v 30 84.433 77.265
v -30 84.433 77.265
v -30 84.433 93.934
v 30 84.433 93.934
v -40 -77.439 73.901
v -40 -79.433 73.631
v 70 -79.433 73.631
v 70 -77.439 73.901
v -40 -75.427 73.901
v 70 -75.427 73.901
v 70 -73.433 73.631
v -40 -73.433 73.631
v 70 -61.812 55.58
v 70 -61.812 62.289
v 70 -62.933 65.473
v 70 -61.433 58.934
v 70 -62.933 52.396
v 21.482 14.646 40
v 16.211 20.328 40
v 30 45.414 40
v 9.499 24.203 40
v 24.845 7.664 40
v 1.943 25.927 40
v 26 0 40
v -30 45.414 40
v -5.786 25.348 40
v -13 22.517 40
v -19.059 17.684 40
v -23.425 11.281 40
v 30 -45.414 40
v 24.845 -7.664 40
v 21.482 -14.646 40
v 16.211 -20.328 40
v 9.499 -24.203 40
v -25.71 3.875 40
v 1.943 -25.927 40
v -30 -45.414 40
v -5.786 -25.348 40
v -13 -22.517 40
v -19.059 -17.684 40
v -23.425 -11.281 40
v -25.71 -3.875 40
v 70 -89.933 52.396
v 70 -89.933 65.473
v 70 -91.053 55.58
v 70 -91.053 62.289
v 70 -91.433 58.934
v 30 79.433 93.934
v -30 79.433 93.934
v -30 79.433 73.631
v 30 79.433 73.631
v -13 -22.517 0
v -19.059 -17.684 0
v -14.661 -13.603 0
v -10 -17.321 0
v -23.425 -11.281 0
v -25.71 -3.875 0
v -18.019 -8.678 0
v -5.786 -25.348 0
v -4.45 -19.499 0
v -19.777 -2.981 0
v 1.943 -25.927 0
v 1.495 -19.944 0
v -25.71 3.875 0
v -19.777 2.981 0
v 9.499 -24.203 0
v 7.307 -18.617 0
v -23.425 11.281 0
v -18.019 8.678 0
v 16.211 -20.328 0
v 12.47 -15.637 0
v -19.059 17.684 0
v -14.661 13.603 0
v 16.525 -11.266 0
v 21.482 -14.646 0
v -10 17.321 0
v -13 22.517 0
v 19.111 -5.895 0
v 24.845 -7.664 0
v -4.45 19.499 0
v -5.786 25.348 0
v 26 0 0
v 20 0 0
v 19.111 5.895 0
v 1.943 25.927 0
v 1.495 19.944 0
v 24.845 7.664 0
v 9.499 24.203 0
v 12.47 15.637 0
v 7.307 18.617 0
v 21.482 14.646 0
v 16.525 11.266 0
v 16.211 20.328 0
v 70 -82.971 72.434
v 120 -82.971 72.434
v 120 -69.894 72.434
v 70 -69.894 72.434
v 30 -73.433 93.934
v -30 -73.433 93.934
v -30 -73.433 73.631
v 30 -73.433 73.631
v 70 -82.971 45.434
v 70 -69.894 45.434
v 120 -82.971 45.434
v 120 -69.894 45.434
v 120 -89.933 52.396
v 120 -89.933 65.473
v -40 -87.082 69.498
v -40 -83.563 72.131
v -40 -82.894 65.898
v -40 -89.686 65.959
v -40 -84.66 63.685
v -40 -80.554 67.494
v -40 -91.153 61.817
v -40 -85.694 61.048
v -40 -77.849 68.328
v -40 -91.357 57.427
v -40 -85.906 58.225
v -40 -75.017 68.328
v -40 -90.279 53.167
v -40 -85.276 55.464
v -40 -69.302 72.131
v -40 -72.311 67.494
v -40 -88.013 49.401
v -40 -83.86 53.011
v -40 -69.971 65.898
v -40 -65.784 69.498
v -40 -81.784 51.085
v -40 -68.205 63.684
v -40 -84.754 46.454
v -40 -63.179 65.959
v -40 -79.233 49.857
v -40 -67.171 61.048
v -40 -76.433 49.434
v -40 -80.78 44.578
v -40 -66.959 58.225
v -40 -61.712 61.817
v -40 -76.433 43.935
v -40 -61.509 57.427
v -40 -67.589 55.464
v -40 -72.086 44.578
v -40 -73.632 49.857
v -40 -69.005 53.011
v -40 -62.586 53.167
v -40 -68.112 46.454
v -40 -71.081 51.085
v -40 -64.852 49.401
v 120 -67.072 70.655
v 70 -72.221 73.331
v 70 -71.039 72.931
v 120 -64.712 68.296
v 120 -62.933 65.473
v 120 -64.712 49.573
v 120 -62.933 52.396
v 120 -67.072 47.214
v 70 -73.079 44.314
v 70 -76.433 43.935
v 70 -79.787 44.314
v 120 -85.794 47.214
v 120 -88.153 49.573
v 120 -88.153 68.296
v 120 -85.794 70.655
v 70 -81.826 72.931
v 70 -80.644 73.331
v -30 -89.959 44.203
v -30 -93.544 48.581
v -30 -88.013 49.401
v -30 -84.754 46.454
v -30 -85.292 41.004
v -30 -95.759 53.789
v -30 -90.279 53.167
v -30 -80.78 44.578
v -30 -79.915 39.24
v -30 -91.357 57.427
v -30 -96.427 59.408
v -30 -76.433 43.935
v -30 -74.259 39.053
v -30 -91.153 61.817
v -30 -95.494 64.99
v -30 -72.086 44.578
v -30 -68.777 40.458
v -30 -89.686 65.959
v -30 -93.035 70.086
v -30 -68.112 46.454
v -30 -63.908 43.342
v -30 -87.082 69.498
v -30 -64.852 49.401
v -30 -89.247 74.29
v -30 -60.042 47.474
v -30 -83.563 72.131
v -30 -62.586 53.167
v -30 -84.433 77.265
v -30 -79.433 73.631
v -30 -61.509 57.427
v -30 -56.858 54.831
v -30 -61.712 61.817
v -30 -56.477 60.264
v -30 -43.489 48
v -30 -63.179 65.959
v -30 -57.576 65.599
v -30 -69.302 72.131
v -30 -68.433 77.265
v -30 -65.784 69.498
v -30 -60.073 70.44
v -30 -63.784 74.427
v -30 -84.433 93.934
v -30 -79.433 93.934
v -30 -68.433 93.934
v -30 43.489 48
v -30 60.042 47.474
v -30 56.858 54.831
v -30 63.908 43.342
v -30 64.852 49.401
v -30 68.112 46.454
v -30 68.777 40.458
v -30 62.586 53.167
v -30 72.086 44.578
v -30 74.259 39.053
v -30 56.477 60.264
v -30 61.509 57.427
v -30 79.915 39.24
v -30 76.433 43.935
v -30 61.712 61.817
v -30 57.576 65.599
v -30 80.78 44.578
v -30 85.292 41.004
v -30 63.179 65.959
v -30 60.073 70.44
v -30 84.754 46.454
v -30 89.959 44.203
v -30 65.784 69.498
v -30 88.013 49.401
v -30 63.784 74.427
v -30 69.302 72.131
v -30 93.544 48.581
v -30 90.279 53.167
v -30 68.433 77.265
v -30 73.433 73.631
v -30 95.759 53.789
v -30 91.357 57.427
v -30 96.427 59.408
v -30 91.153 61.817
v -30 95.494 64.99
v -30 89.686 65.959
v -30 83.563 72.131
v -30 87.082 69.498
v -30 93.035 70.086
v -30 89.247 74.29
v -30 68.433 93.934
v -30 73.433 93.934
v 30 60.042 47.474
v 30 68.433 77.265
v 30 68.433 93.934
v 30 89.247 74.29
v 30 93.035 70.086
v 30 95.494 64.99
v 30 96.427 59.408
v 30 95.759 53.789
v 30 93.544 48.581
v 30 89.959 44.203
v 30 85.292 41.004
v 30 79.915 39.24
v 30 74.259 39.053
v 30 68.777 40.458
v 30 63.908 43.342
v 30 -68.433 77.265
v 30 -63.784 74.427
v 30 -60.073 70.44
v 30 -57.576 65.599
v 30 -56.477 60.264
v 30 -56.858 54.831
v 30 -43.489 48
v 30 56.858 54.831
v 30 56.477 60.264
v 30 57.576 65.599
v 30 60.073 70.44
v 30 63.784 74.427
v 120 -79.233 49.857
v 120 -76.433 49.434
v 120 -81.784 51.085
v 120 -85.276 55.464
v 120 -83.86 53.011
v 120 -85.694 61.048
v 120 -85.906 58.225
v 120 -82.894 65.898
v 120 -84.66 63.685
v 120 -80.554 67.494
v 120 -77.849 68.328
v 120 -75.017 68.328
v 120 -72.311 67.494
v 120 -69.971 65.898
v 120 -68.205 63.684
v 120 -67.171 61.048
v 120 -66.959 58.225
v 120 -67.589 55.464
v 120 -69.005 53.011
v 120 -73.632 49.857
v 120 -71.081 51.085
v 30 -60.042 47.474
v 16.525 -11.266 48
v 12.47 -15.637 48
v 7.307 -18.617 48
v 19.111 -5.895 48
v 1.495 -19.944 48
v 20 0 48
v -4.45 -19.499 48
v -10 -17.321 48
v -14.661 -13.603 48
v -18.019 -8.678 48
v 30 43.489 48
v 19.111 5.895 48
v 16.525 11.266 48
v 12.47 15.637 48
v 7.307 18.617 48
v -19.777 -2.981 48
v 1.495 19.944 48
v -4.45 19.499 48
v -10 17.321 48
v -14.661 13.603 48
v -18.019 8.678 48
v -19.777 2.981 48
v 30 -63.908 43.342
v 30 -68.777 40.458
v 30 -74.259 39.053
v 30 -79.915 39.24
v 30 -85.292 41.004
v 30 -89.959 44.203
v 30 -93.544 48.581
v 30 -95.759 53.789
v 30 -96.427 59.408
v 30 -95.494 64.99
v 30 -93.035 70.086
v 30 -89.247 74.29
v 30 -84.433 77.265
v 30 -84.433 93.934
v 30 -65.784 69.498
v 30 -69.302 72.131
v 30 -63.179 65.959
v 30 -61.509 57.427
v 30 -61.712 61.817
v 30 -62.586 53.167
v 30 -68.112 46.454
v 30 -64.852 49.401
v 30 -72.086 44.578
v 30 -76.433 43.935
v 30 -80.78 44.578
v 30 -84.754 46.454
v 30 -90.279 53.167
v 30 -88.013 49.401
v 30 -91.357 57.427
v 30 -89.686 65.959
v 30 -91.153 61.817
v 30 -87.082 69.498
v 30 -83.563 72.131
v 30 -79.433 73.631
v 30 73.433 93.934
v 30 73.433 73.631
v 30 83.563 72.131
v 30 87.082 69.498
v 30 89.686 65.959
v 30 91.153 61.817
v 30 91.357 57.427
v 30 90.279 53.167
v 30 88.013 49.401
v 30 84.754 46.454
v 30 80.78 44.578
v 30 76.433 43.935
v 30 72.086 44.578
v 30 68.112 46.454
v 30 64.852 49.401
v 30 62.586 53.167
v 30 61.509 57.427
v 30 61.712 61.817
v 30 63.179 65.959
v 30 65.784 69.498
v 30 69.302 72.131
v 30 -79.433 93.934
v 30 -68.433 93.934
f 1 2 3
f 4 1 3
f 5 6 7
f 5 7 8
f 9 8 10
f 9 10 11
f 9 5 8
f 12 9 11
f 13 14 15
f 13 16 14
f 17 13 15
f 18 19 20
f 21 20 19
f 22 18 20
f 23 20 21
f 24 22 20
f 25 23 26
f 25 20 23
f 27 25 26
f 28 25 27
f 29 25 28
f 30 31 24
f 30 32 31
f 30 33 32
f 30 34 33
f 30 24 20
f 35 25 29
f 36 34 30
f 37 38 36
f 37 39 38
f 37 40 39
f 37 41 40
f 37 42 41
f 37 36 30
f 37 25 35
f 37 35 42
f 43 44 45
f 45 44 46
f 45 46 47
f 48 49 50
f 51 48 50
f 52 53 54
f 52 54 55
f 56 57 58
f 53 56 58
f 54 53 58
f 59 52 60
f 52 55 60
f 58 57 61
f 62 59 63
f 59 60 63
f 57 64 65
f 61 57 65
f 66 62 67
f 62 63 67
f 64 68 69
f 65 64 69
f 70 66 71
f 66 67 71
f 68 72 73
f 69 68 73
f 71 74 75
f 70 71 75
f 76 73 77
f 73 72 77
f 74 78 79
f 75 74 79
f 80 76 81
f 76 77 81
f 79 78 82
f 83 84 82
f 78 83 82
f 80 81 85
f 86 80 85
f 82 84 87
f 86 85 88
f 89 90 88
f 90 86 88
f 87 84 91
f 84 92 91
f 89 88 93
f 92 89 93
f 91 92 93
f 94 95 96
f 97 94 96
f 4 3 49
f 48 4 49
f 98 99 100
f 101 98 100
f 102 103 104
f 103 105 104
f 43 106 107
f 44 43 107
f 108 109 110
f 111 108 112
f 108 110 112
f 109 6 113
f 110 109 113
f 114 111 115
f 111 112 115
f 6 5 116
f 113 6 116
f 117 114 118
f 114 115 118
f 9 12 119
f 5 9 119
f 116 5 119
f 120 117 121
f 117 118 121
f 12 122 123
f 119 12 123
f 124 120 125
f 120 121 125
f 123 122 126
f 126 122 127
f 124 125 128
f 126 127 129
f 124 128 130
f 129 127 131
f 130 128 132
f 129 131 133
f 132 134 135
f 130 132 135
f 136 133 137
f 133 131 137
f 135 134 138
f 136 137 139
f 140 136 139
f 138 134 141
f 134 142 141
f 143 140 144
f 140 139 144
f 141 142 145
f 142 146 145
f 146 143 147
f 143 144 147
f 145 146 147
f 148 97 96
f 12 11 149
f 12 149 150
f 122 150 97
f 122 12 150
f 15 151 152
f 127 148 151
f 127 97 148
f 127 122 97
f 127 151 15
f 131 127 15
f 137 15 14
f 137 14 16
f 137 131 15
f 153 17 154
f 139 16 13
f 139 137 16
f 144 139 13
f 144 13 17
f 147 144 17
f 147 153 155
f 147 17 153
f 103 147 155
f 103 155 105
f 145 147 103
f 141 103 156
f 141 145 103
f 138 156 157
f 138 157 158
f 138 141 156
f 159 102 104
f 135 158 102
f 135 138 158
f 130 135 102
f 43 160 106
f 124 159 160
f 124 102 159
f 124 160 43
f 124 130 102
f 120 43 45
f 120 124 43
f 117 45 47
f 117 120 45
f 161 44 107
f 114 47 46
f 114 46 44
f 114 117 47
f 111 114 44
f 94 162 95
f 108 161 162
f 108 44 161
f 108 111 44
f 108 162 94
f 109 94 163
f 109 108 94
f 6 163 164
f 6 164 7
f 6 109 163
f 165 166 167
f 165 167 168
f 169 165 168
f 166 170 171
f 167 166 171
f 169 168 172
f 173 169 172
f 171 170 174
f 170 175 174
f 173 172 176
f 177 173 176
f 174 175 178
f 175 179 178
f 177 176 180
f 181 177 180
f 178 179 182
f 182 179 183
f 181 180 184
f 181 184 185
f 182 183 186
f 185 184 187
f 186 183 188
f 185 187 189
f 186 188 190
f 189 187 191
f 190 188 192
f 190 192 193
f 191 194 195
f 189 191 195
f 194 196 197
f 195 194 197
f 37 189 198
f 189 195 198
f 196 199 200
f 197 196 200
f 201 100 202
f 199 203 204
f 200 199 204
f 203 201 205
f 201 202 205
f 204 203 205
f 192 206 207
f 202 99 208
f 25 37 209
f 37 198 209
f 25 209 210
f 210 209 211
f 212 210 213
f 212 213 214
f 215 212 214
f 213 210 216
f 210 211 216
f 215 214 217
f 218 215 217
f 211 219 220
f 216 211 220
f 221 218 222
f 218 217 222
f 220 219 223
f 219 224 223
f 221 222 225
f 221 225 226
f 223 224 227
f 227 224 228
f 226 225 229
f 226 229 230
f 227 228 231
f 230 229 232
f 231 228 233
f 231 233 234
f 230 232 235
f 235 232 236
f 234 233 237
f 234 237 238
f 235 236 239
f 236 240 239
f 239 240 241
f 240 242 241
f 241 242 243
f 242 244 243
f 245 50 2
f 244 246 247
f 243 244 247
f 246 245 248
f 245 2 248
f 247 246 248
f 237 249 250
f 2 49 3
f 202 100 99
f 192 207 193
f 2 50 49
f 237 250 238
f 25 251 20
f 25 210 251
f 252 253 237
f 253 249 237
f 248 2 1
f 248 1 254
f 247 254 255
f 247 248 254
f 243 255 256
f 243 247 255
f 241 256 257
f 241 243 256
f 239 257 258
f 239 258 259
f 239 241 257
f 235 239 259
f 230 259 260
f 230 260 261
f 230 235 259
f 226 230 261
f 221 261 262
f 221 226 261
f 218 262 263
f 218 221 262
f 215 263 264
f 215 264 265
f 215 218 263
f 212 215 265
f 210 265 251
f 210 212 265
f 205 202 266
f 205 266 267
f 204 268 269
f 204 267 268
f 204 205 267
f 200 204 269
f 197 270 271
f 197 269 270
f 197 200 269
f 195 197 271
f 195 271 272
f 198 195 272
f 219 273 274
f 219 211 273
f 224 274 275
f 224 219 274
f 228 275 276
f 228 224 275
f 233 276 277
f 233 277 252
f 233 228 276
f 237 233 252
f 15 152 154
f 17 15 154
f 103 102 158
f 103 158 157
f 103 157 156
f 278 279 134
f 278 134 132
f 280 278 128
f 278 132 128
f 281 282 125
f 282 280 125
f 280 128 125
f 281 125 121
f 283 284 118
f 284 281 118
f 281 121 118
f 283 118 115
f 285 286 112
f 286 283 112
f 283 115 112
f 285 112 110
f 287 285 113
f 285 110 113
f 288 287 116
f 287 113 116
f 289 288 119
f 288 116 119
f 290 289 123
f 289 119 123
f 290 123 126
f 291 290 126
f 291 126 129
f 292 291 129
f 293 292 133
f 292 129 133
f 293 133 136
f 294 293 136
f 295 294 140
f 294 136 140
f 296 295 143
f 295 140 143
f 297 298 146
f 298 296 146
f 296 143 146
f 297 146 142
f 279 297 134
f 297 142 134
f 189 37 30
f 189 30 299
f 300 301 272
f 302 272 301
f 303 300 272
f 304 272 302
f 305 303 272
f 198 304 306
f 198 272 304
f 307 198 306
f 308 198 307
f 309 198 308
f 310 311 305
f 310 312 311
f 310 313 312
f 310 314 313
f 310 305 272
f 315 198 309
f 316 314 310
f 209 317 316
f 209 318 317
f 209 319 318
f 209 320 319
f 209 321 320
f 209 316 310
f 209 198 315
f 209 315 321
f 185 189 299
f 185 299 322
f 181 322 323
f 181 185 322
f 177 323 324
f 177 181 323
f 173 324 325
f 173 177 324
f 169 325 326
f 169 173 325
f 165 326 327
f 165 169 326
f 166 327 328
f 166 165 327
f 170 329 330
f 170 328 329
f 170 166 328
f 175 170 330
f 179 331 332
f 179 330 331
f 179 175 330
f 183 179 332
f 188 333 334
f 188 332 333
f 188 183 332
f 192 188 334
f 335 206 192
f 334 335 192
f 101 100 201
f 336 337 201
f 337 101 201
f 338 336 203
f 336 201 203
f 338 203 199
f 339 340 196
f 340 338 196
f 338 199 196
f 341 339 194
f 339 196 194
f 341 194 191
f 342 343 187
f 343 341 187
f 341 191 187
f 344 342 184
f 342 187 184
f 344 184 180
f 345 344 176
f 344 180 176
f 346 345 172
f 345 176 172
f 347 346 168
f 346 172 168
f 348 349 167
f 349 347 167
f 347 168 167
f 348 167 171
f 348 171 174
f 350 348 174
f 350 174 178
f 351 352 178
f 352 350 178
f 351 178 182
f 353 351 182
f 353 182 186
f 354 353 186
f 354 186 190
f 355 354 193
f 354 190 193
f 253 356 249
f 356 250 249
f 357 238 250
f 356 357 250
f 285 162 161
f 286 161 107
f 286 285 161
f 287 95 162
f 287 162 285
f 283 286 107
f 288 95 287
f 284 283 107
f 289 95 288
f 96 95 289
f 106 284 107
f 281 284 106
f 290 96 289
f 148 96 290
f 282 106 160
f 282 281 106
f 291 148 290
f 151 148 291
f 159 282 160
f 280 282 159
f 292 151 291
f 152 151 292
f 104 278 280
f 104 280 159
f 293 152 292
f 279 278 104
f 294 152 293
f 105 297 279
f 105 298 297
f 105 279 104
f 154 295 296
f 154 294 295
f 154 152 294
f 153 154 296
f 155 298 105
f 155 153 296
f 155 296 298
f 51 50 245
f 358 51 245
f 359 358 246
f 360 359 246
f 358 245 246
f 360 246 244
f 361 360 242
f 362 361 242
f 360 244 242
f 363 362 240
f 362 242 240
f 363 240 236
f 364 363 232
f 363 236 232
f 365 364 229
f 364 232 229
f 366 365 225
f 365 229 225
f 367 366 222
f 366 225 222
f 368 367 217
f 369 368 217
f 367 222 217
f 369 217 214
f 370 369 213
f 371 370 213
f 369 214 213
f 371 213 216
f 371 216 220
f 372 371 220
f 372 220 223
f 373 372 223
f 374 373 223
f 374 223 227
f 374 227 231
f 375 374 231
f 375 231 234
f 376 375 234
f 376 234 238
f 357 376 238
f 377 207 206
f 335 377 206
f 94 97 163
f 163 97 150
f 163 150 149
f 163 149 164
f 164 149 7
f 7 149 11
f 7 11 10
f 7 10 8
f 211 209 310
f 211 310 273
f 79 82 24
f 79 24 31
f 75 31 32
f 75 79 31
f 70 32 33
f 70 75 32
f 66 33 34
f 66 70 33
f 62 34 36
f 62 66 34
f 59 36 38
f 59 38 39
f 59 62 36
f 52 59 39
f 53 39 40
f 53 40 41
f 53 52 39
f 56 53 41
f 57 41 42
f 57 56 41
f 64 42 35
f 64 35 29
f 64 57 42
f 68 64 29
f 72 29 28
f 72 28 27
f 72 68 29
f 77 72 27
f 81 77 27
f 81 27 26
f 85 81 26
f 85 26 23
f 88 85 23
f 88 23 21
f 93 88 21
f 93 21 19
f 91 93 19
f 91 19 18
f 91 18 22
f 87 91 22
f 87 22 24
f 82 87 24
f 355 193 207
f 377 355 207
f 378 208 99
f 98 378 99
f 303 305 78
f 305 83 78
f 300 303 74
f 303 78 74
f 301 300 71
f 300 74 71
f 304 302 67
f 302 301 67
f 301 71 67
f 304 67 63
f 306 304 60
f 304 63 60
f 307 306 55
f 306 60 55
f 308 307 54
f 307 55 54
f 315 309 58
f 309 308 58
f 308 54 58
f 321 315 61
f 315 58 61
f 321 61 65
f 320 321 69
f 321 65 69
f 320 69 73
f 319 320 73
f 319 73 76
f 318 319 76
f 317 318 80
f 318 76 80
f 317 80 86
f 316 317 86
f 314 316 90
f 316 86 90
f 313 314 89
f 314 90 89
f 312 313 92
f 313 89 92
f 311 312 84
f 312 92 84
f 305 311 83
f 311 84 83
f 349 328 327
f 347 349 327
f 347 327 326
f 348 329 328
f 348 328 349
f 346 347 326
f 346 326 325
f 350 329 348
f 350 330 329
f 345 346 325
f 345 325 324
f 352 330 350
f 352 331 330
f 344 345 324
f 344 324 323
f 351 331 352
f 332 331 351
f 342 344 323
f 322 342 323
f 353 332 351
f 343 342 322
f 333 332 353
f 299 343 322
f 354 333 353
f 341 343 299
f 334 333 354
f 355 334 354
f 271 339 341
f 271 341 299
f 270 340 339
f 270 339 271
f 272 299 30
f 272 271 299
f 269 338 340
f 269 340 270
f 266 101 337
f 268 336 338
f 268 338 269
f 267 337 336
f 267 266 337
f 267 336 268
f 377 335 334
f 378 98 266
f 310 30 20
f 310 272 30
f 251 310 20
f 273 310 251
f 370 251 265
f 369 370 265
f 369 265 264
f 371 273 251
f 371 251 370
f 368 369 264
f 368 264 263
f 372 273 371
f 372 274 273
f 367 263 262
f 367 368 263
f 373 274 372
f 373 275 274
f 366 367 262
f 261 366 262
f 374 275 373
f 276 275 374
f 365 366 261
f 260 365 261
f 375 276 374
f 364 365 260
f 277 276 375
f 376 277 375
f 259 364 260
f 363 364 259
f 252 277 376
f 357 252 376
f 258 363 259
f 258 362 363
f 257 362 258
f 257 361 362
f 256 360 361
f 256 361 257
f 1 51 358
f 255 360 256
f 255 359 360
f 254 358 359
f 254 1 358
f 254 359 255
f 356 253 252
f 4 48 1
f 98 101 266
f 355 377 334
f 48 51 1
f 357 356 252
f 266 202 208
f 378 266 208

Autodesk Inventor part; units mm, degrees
ref_plane "YZ Plane" through (0, 0, 0) normal (1, 0, 0) x (0, 1, 0)
ref_plane "XZ Plane" through (0, 0, 0) normal (0, 1, 0) x (-1, 0, 0)
ref_plane "XY Plane" through (0, 0, 0) normal (0, 0, 1) x (1, 0, 0)
sketch "Náčrt1" plane through (0, 0, 0) normal (0, 0, 1) x (1, 0, 0)
  point P0 (0, 0)
sketch "Náčrt2" plane through (0, 0, 0) normal (0, 0, 1) x (1, 0, 0)
  circle A0 centre (0, 0) radius 20
  circle A1 centre (0, 0) radius 26
  dimension "d0" = 40
  dimension "d1" = 6
extrude "Vysunutí1" add sketch "Náčrt2" along normal blind 40
sketch "Náčrt3" plane through (0, 0, 0) normal (1, 0, 0) x (0, 1, 0)
  line L0 (26, 40) -> (-26, 40) projected
  line L1 (0, 40) -> (-45.414, 40)
  line L2 (-45.414, 40) -> (-62.0898, 48.5204)
  line L3 (-58.9679, 55.909) -> (-43.4886, 48)
  line L4 (-43.4886, 48) -> (0, 48)
  arc A0 (-79.4326, 78.7082) -> (-73.4326, 78.7082) centre (-76.4326, 58.9345) ccw
  line L5 (-58.9679, 55.909) -> (-62.0898, 48.5204)
  line L6 (-60.5289, 52.2147) -> (-76.4326, 58.9345) construction
  line L7 (-76.4326, 58.9345) -> (-76.4326, 91.1664) construction
  line L8 (-79.4326, 93.9345) -> (-84.4326, 93.9345)
  line L9 (-84.4326, 93.9345) -> (-84.4326, 73.6314)
  line L10 (-84.4326, 73.6314) -> (-79.4326, 73.6314)
  line L11 (-79.4326, 73.6314) -> (-79.4326, 93.9345)
  line L12 (-73.4326, 73.6314) -> (-68.4326, 73.6314)
  line L13 (-68.4326, 73.6314) -> (-68.4326, 93.9345)
  line L14 (-68.4326, 93.9345) -> (-73.4326, 93.9345)
  line L15 (-73.4326, 93.9345) -> (-73.4326, 73.6314)
  arc A1 (-79.4326, 73.6314) -> (-73.4326, 73.6314) centre (-76.4326, 58.9345) ccw
  line L16 (0, 48) -> (0, 40)
  point P0 (0, 0)
  dimension "d4" = 8
  dimension "d5" = 40
  dimension "d7" = 5
  dimension "d8" = 6
  dimension "d9" = 3
  dimension "d10" = 15
extrude "Vysunutí2" add sketch "Náčrt3" along normal mid plane 60
mirror "Zrcadlit1" about plane through (0, 0, 0) normal (0, 1, 0) of "Vysunutí2"
sketch "Náčrt4" plane through (-30, -43.4886, 48) normal (0, 0, 1) x (1, 0, 0)
  circle A0 centre (30, 43.4886) radius 20 projected
extrude "Vysunutí3" cut sketch "Náčrt4" against normal blind 40
sketch "Náčrt5" plane through (30, 0, 0) normal (1, 0, 0) x (0, 0, -1)
  arc A0 (-73.6314, -79.4326) -> (-73.6314, -73.4326) centre (-58.9345, -76.4326) ccw projected
  circle A1 centre (-58.9345, -76.4326) radius 15
  circle A2 centre (-58.9345, -76.4326) radius 9.5
  point P0 (0, 0)
  dimension "d15" = 19
extrude "Vysunutí4" add sketch "Náčrt5" along normal blind 90 and the other way blind 70 separate body
sketch "Náčrt6" plane through (120, -76.4326, 58.9345) normal (1, 0, 0) x (0, 0, -1)
  line L0 (13.5, -13.5) -> (-13.5, -13.5)
  line L1 (-13.5, -13.5) -> (-13.5, 13.5)
  line L2 (-13.5, 13.5) -> (13.5, 13.5)
  line L3 (13.5, 13.5) -> (13.5, -13.5)
  line L4 (13.5, -13.5) -> (-13.5, 13.5) construction
  line L5 (-13.5, -13.5) -> (13.5, 13.5) construction
  circle A0 centre (0, 0) radius 9.5 projected
  line L6 (-20.2709, 20.2709) -> (-20.2709, -20.2709)
  line L7 (-20.2709, -20.2709) -> (20.2709, -20.2709)
  line L8 (20.2709, -20.2709) -> (20.2709, 20.2709)
  line L9 (20.2709, 20.2709) -> (-20.2709, 20.2709)
  point P0 (58.9345, 76.4326)
  dimension "d20" = 27
extrude "Vysunutí5" cut sketch "Náčrt6" against normal blind 50 contours L9 L8 L7 L6 bodies 2
equation "\"d9\" = 0.5 * d8"
properties part number "B8-A4"
